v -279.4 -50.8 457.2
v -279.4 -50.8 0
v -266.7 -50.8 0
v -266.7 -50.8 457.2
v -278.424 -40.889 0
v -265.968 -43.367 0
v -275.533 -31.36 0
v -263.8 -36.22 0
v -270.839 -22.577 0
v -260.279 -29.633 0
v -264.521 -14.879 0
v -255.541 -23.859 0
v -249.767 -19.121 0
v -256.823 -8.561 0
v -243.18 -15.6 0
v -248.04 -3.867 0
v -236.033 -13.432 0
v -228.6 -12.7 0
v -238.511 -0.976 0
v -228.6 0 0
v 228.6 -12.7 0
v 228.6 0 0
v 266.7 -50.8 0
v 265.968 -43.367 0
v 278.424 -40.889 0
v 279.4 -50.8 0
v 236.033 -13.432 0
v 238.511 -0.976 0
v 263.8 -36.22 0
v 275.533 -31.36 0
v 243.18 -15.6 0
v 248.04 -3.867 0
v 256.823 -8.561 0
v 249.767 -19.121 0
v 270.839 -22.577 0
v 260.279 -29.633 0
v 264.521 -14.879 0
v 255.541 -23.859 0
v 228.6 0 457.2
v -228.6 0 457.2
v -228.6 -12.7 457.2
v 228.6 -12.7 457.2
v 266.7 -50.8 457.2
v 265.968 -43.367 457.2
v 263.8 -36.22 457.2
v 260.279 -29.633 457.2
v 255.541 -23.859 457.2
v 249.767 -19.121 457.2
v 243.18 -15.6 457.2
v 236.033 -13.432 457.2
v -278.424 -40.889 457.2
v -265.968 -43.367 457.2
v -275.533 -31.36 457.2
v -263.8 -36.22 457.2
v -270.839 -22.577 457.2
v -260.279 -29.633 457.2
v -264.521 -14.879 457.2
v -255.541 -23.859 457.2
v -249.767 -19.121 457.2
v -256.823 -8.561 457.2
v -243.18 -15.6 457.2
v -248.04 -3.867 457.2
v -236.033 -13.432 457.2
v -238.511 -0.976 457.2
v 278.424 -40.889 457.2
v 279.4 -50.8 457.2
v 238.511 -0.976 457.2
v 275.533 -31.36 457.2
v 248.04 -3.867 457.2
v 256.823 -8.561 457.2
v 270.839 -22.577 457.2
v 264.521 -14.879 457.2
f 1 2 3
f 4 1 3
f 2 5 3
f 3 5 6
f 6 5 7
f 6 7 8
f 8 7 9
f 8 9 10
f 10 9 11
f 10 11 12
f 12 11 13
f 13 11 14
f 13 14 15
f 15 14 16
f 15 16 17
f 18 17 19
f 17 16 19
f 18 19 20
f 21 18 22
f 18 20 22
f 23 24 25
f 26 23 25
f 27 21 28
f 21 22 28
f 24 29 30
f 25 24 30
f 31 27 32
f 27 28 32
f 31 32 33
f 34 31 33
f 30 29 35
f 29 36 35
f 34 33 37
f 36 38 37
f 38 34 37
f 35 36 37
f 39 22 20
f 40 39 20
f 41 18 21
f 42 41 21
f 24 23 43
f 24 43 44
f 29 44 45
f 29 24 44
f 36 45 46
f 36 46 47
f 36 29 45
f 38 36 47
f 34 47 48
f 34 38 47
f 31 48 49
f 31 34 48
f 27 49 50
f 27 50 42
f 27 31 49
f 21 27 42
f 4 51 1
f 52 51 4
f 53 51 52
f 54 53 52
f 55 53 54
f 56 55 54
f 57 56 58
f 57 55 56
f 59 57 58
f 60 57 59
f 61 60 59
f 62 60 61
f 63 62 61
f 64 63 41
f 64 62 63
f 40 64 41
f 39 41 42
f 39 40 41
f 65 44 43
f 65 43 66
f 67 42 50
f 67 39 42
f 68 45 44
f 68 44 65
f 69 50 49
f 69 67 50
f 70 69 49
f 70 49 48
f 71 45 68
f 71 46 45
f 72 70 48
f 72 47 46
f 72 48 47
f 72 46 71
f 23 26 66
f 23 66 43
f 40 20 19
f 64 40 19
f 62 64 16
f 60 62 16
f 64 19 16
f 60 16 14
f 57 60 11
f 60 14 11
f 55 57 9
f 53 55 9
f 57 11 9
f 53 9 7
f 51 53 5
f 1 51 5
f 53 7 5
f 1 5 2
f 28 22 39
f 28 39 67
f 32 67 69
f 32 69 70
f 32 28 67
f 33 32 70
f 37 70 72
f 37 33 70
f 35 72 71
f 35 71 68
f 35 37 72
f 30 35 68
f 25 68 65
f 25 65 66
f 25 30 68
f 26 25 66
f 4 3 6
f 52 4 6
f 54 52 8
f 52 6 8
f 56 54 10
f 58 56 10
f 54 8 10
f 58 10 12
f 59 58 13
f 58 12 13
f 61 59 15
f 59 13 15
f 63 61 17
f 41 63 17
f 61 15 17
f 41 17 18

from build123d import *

# Parameters (mm, degrees)
EXTRUDE_THIN1_DEPTH = 457.2


with BuildPart() as part:
    # Sketch1 → Extrude-Thin1 (new body)
    with BuildSketch(Plane.XY):
        with BuildLine():
            Line((0, 0), (228.6, 0))
            ThreePointArc((228.6, 0), (264.521024484, -14.878975516), (279.4, -50.8))
            Line((279.4, -50.8), (266.7, -50.8))
            ThreePointArc((266.7, -50.8), (255.540768363, -23.859231637), (228.6, -12.7))
            Line((228.6, -12.7), (0, -12.7))
            Line((0, -12.7), (0, 0))
        make_face()
    extrude_thin1 = extrude(amount=EXTRUDE_THIN1_DEPTH)

    # Mirror1: Extrude-Thin1 across plane
    add(extrude_thin1.mirror(Plane(origin=(0, -12.7, 457.2), x_dir=(0, 0, 1), z_dir=(-1, 0, 0))))


solid = part.part
